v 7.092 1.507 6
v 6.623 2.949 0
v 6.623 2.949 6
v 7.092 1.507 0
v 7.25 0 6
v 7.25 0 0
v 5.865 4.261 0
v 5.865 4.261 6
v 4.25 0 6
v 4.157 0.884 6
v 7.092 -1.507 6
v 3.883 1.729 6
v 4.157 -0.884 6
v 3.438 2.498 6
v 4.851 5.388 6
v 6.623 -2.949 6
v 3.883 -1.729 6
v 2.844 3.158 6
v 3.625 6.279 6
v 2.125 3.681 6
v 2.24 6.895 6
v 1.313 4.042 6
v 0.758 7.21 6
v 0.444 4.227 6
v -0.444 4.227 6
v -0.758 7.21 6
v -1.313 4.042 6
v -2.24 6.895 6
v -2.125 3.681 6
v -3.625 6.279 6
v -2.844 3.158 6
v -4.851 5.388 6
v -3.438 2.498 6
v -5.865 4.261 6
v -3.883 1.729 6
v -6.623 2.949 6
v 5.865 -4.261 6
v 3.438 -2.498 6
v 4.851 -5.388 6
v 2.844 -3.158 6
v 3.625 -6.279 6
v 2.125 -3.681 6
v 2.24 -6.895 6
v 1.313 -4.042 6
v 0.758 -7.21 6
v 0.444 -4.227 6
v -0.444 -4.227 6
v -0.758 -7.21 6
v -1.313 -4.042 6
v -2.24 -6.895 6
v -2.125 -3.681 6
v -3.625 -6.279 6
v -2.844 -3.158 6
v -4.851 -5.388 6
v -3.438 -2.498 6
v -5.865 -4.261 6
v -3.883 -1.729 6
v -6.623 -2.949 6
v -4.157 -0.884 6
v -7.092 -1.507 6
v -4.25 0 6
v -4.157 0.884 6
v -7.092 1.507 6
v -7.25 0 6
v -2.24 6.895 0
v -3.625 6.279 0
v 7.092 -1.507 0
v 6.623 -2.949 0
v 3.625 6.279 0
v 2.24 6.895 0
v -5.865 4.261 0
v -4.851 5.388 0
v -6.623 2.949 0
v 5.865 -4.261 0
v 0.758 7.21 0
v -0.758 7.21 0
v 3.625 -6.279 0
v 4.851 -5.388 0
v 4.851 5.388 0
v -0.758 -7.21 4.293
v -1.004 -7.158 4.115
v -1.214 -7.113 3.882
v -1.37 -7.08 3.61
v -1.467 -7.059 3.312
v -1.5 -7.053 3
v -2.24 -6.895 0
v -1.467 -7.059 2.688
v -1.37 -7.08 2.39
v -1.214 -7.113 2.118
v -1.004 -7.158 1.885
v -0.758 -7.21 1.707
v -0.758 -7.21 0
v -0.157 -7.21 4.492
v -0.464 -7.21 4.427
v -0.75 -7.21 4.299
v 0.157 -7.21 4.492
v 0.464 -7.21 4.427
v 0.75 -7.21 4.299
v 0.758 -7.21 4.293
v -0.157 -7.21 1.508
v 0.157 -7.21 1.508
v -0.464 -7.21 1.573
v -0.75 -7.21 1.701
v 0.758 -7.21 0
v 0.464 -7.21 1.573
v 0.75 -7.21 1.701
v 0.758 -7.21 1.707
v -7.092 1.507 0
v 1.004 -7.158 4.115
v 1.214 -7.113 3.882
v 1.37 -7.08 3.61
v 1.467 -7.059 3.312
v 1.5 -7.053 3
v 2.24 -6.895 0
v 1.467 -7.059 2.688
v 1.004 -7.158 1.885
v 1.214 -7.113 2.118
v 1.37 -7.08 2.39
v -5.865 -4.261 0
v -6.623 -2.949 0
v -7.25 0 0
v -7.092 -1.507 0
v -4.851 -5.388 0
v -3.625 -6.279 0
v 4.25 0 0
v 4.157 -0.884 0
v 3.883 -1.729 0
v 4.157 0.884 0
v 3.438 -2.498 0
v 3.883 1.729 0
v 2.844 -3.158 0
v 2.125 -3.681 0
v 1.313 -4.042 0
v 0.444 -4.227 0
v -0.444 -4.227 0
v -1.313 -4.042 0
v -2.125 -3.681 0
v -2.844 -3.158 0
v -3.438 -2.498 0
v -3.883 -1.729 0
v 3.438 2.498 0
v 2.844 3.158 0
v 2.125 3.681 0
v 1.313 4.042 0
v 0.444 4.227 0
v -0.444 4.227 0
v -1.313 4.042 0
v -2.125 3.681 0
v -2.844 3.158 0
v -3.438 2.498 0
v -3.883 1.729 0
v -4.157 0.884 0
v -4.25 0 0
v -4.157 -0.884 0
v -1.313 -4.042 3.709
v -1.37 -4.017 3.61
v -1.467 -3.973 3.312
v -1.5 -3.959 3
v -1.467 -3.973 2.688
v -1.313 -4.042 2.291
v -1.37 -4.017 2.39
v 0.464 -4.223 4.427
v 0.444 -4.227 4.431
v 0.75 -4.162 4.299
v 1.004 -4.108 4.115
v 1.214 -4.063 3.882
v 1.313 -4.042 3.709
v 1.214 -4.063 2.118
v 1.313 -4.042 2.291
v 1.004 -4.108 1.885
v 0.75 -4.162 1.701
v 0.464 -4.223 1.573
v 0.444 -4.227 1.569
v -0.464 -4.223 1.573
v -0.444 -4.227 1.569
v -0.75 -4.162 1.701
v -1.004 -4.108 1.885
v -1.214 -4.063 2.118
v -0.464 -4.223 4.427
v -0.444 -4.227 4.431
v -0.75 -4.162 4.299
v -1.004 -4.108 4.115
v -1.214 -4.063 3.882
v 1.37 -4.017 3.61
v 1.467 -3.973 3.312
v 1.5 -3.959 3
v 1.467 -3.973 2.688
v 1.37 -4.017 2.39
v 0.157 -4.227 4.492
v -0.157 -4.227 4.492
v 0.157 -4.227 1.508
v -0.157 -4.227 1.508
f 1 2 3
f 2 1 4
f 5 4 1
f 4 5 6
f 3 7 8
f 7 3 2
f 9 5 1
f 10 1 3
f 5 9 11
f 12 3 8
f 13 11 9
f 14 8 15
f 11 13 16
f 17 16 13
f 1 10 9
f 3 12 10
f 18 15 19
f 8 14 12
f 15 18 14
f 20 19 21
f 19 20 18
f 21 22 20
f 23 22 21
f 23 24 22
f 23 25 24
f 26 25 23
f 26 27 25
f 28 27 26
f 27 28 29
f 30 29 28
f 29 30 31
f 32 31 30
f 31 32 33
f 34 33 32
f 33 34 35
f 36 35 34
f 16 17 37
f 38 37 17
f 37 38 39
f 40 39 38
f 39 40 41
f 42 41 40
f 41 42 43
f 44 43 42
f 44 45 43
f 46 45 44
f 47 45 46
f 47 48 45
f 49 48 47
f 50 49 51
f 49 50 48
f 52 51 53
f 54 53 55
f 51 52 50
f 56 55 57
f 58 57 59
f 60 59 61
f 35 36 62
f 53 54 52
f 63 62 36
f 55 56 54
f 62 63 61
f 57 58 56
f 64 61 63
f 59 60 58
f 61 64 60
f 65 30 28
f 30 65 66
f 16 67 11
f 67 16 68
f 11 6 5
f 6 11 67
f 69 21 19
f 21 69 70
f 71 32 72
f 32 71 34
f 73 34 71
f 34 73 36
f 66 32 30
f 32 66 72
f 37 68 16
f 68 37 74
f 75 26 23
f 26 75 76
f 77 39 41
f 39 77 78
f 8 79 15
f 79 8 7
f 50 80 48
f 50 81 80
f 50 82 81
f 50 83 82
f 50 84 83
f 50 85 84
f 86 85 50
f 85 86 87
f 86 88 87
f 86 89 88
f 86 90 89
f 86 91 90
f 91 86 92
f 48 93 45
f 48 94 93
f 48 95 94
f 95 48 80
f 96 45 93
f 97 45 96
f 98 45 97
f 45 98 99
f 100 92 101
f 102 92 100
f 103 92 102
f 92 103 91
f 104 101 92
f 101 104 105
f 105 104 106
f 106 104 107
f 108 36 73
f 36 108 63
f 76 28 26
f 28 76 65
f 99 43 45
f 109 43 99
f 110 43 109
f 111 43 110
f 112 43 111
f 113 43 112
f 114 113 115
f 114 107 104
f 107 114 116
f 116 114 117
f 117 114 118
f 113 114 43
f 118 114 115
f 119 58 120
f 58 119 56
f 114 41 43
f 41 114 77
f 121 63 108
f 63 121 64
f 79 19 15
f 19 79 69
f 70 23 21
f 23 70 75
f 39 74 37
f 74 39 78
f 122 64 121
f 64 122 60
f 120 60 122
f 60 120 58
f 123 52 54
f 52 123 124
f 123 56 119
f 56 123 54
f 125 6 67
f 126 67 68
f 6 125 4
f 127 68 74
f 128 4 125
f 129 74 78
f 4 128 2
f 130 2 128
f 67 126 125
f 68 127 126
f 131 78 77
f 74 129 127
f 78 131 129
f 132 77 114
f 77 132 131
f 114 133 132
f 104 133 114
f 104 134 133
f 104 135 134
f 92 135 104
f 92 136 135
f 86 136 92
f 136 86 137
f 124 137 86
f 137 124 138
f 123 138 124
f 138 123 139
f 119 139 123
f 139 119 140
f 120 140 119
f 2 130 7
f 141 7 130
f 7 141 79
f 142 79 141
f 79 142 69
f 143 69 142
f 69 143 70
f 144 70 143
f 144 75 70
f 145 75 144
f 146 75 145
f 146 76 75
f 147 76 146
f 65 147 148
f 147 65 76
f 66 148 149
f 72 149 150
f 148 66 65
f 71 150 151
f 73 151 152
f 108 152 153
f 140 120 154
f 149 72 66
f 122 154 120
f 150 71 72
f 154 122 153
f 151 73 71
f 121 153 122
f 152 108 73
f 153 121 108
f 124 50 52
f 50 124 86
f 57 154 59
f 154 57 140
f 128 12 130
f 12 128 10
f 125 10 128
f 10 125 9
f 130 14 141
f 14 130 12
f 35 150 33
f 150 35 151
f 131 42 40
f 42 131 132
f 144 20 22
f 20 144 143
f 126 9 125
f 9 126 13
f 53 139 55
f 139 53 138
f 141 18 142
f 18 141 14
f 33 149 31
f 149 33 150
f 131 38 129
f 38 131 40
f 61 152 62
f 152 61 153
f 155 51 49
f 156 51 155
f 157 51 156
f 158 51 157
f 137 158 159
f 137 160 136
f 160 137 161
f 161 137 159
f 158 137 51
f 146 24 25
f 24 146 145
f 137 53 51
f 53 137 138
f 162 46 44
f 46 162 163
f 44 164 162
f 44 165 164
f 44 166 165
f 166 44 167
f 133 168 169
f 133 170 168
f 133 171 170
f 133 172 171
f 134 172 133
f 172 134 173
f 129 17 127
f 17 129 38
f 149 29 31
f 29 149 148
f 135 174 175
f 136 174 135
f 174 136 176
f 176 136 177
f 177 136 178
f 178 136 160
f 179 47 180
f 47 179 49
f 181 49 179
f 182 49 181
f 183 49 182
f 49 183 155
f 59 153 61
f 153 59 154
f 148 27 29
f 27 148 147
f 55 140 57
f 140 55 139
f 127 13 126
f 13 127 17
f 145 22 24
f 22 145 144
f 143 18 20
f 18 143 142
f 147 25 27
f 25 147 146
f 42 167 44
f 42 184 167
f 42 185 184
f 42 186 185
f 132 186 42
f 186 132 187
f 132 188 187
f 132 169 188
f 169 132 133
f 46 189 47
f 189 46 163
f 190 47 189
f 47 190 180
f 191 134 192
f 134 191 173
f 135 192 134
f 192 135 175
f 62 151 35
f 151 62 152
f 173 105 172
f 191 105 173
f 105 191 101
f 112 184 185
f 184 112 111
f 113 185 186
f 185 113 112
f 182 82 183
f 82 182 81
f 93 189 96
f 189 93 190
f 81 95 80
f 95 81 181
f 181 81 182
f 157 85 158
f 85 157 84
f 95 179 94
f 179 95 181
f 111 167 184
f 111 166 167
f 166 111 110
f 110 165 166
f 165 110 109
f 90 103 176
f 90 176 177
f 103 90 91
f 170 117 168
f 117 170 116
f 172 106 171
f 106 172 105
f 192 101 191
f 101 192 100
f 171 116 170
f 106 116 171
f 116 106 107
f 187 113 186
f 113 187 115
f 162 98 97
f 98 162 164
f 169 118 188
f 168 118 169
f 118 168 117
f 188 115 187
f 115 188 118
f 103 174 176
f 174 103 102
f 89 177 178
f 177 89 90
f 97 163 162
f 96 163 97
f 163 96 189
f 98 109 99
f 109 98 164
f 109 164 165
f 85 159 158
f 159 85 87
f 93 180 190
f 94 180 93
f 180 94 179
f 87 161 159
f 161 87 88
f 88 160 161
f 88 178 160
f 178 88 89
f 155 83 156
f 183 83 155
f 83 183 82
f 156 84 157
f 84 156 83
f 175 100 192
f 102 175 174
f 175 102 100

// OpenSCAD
$fn = 30;
screw_radius = 1.5;
inner_radius = 4.25;
outer_radius = 7.25;

part_height = 6;

module ring(inner_radius,outer_radius) {
    difference() {
        cylinder(r=outer_radius, h=part_height);
        cylinder(r=inner_radius, h=part_height);
    }
}



module screw_collar() {
    difference() {
        ring(inner_radius,outer_radius);
        translate([0,0,part_height/2])
       { 
           rotate([90,0,0]) {
               cylinder(r=screw_radius,h=part_height*2);
           }
       }
    }
}

screw_collar();
